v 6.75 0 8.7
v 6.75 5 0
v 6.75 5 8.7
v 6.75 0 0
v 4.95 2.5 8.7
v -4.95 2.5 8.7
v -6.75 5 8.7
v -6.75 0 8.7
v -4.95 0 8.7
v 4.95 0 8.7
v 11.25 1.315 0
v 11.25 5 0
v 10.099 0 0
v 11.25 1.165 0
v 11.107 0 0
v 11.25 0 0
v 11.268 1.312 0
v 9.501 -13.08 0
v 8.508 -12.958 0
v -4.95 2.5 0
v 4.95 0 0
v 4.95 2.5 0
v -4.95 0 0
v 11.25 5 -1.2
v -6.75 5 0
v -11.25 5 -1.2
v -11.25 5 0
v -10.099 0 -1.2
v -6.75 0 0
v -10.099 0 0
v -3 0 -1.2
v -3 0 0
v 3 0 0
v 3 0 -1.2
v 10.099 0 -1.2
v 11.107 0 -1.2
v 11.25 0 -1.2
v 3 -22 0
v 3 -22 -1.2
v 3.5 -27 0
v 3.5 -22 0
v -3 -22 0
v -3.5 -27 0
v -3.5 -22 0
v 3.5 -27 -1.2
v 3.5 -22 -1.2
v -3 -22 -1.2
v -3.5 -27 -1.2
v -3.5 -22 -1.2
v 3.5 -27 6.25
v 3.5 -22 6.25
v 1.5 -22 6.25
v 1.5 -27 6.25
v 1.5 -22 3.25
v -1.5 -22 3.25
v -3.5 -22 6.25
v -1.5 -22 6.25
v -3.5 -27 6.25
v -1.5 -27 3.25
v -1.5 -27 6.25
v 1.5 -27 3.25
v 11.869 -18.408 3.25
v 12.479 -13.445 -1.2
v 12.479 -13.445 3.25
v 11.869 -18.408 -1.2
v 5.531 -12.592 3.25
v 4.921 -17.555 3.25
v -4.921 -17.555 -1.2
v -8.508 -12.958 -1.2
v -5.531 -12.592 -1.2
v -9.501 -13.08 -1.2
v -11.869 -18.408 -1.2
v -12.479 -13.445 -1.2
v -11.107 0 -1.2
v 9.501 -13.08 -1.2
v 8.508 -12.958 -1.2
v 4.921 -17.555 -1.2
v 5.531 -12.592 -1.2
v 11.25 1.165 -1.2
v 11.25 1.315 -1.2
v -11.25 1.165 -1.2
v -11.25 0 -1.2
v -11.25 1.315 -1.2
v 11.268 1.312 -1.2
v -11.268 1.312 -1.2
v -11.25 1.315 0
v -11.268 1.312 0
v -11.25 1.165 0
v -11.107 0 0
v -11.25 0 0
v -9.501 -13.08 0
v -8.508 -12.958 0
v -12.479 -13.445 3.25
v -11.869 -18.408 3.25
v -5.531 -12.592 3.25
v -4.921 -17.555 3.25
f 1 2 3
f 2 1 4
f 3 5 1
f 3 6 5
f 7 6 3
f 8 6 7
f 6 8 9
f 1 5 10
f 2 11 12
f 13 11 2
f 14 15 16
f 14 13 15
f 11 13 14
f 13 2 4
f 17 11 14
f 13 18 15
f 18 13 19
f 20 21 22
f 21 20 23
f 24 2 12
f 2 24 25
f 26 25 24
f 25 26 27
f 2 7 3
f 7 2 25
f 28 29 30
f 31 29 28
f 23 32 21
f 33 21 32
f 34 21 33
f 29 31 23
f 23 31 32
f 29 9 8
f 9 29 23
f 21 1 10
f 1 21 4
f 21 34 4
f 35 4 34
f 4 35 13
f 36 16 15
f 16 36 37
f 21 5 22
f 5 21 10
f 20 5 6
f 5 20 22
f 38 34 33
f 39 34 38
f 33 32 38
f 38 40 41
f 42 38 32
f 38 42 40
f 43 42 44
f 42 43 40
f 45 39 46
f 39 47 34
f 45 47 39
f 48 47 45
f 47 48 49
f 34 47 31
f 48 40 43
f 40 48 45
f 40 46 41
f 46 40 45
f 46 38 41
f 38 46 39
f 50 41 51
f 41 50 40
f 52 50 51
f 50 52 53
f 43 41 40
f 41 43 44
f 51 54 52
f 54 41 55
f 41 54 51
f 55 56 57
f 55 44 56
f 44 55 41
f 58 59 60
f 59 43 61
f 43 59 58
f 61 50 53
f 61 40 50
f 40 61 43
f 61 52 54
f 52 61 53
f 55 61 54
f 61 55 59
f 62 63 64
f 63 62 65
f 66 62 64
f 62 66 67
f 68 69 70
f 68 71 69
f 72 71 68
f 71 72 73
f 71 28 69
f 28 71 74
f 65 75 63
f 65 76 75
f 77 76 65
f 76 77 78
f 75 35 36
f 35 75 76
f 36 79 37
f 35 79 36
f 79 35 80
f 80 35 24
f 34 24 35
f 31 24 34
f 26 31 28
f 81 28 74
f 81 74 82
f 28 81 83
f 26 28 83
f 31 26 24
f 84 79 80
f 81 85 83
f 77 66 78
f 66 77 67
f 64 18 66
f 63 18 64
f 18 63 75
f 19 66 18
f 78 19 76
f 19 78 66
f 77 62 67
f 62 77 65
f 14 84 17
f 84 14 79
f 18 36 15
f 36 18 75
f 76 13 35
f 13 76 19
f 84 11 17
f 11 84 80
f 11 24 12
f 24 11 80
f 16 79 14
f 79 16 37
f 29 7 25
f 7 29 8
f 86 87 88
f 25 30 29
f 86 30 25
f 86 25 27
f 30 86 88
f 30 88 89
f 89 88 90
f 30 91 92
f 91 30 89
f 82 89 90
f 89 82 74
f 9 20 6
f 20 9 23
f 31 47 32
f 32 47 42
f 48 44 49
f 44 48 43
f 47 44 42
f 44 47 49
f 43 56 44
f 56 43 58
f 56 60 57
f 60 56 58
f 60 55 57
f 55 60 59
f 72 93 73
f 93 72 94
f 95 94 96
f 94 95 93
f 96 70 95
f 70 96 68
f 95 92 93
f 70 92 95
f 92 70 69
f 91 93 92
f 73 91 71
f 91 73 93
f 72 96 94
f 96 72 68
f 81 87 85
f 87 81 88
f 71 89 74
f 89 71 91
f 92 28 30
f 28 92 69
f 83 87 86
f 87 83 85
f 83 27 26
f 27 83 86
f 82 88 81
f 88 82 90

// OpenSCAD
/* Pole holder centered on the holder */
module poleHolder(radius,headradius,pivotlength)
{
  translate(v=[-radius-2,-2.5,0])
  {
    difference()
    {
      translate(v=[0,0,-1.2])
        cube(size=[2*radius+4,5,headradius+radius+1.2]);
      translate(v=[2,0,headradius-radius])
        cube(size=[2*radius,5,2*radius]);
    }
  }

  translate(v=[-0.5,0,-1.2])
    cube(size=[1.0,pivotlength,0.8]);
}

/* Pole holder centered on the holder */
module poleHolderNoUpright(radius,headradius,pivotlength)
{
  translate(v=[-radius,-2.5,0])
  {
    translate(v=[-2,0,-1.2])
      cube(size=[2*radius+4,5,headradius-radius+1.2]);
  }

  translate(v=[-0.5,0,-1.2])
    cube(size=[1.0,pivotlength,1.2]);
}

module halfRelay(radius,headradius)
{
  /* Half a nail head holder */
  difference()
  {
    cube(size=[headradius+2,5,2*headradius-0.8]);

    cube(size=[headradius+0.2,2.5,2*headradius-0.8]);
  }

  translate(v=[0,0,-1.2])
    cube(size=[headradius+6.5,5,1.2]);

  translate(v=[0,-27,-1.2])
  {
    cube(size=[3,27,1.2]);

    cube(size=[3.5,5,1.2]);
  }

  /* Half a nail stem holder */
  translate(v=[0,-27,0])
    difference()
    {
      cube(size=[radius+2,5,headradius+radius]);
      translate(v=[0,0,headradius-radius])
        cube(size=[radius,5,2*radius]);
    }

  translate(v=[8.7,-15.5,0])
    rotate([0,0,-7.0])
      poleHolderNoUpright(radius,headradius,17);
}

halfRelay(1.5,4.75);
mirror([1,0,0])
  halfRelay(1.5,4.75);
